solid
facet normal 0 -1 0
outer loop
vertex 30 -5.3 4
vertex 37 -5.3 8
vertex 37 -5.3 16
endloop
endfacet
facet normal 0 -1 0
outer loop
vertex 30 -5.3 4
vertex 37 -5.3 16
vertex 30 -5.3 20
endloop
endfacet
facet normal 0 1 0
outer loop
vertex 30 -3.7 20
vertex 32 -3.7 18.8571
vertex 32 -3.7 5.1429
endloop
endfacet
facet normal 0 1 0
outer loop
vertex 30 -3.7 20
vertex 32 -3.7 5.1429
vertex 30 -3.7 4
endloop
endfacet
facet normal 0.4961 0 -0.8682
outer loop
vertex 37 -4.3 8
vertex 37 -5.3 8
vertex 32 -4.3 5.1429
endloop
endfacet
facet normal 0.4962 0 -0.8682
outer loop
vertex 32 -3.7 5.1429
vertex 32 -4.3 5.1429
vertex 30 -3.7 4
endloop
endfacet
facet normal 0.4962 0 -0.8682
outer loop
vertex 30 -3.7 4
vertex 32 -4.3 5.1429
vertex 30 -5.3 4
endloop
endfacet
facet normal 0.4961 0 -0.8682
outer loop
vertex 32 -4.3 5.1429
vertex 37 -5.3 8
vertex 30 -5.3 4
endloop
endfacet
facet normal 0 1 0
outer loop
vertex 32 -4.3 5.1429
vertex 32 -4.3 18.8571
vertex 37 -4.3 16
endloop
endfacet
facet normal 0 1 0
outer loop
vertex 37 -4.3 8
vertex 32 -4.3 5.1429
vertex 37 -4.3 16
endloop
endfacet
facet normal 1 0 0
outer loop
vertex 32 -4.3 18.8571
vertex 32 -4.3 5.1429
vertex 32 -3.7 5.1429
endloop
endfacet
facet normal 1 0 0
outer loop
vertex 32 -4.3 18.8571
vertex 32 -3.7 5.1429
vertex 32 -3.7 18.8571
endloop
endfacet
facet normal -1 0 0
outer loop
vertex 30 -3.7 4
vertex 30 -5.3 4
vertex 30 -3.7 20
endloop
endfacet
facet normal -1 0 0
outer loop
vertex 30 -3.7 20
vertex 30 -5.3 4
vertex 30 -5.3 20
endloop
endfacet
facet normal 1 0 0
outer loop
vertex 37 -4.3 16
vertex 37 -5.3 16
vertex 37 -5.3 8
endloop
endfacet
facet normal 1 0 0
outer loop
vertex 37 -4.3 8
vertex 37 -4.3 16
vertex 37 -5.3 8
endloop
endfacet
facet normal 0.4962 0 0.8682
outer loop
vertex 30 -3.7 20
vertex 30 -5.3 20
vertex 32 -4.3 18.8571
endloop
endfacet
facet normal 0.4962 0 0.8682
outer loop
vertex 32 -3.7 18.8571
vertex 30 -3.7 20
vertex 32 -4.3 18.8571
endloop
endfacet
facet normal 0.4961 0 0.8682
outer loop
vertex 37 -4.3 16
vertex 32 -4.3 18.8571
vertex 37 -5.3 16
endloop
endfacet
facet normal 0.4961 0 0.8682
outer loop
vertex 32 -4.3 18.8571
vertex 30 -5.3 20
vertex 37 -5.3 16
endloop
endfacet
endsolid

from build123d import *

# Parameters (mm, degrees)
SKETCH043_W      = 6
SKETCH043_H      = 16
EXTRUDE052_DEPTH = 1.6
EXTRUDE_DEPTH    = 1.6


with BuildPart() as extrude052:
    # Sketch043 → Extrude052 (new body)
    with BuildSketch(Plane.XZ.offset(-4.3)):
        with Locations((35, 12)):
            Rectangle(SKETCH043_W, SKETCH043_H)
    extrude(amount=EXTRUDE052_DEPTH)


with BuildPart() as body005:
    # Sketch → Extrude (new body)
    with BuildSketch(Plane.XZ.offset(-5.3)):
        Polygon((37, 16), (37, 8), (30, 4), (30, 20), align=None)
    extrude(amount=EXTRUDE_DEPTH)

    # Cut028: cut Extrude052
    add(extrude052.part, mode=Mode.SUBTRACT)


with BuildPart() as switch_protector001:
    # Part__Mirroring005: instance of Body005
    add(body005.part.mirror(Plane(origin=(0, 0, 0), x_dir=(1, 0, 0), z_dir=(0, 1, 0))))


solid = switch_protector001.part
